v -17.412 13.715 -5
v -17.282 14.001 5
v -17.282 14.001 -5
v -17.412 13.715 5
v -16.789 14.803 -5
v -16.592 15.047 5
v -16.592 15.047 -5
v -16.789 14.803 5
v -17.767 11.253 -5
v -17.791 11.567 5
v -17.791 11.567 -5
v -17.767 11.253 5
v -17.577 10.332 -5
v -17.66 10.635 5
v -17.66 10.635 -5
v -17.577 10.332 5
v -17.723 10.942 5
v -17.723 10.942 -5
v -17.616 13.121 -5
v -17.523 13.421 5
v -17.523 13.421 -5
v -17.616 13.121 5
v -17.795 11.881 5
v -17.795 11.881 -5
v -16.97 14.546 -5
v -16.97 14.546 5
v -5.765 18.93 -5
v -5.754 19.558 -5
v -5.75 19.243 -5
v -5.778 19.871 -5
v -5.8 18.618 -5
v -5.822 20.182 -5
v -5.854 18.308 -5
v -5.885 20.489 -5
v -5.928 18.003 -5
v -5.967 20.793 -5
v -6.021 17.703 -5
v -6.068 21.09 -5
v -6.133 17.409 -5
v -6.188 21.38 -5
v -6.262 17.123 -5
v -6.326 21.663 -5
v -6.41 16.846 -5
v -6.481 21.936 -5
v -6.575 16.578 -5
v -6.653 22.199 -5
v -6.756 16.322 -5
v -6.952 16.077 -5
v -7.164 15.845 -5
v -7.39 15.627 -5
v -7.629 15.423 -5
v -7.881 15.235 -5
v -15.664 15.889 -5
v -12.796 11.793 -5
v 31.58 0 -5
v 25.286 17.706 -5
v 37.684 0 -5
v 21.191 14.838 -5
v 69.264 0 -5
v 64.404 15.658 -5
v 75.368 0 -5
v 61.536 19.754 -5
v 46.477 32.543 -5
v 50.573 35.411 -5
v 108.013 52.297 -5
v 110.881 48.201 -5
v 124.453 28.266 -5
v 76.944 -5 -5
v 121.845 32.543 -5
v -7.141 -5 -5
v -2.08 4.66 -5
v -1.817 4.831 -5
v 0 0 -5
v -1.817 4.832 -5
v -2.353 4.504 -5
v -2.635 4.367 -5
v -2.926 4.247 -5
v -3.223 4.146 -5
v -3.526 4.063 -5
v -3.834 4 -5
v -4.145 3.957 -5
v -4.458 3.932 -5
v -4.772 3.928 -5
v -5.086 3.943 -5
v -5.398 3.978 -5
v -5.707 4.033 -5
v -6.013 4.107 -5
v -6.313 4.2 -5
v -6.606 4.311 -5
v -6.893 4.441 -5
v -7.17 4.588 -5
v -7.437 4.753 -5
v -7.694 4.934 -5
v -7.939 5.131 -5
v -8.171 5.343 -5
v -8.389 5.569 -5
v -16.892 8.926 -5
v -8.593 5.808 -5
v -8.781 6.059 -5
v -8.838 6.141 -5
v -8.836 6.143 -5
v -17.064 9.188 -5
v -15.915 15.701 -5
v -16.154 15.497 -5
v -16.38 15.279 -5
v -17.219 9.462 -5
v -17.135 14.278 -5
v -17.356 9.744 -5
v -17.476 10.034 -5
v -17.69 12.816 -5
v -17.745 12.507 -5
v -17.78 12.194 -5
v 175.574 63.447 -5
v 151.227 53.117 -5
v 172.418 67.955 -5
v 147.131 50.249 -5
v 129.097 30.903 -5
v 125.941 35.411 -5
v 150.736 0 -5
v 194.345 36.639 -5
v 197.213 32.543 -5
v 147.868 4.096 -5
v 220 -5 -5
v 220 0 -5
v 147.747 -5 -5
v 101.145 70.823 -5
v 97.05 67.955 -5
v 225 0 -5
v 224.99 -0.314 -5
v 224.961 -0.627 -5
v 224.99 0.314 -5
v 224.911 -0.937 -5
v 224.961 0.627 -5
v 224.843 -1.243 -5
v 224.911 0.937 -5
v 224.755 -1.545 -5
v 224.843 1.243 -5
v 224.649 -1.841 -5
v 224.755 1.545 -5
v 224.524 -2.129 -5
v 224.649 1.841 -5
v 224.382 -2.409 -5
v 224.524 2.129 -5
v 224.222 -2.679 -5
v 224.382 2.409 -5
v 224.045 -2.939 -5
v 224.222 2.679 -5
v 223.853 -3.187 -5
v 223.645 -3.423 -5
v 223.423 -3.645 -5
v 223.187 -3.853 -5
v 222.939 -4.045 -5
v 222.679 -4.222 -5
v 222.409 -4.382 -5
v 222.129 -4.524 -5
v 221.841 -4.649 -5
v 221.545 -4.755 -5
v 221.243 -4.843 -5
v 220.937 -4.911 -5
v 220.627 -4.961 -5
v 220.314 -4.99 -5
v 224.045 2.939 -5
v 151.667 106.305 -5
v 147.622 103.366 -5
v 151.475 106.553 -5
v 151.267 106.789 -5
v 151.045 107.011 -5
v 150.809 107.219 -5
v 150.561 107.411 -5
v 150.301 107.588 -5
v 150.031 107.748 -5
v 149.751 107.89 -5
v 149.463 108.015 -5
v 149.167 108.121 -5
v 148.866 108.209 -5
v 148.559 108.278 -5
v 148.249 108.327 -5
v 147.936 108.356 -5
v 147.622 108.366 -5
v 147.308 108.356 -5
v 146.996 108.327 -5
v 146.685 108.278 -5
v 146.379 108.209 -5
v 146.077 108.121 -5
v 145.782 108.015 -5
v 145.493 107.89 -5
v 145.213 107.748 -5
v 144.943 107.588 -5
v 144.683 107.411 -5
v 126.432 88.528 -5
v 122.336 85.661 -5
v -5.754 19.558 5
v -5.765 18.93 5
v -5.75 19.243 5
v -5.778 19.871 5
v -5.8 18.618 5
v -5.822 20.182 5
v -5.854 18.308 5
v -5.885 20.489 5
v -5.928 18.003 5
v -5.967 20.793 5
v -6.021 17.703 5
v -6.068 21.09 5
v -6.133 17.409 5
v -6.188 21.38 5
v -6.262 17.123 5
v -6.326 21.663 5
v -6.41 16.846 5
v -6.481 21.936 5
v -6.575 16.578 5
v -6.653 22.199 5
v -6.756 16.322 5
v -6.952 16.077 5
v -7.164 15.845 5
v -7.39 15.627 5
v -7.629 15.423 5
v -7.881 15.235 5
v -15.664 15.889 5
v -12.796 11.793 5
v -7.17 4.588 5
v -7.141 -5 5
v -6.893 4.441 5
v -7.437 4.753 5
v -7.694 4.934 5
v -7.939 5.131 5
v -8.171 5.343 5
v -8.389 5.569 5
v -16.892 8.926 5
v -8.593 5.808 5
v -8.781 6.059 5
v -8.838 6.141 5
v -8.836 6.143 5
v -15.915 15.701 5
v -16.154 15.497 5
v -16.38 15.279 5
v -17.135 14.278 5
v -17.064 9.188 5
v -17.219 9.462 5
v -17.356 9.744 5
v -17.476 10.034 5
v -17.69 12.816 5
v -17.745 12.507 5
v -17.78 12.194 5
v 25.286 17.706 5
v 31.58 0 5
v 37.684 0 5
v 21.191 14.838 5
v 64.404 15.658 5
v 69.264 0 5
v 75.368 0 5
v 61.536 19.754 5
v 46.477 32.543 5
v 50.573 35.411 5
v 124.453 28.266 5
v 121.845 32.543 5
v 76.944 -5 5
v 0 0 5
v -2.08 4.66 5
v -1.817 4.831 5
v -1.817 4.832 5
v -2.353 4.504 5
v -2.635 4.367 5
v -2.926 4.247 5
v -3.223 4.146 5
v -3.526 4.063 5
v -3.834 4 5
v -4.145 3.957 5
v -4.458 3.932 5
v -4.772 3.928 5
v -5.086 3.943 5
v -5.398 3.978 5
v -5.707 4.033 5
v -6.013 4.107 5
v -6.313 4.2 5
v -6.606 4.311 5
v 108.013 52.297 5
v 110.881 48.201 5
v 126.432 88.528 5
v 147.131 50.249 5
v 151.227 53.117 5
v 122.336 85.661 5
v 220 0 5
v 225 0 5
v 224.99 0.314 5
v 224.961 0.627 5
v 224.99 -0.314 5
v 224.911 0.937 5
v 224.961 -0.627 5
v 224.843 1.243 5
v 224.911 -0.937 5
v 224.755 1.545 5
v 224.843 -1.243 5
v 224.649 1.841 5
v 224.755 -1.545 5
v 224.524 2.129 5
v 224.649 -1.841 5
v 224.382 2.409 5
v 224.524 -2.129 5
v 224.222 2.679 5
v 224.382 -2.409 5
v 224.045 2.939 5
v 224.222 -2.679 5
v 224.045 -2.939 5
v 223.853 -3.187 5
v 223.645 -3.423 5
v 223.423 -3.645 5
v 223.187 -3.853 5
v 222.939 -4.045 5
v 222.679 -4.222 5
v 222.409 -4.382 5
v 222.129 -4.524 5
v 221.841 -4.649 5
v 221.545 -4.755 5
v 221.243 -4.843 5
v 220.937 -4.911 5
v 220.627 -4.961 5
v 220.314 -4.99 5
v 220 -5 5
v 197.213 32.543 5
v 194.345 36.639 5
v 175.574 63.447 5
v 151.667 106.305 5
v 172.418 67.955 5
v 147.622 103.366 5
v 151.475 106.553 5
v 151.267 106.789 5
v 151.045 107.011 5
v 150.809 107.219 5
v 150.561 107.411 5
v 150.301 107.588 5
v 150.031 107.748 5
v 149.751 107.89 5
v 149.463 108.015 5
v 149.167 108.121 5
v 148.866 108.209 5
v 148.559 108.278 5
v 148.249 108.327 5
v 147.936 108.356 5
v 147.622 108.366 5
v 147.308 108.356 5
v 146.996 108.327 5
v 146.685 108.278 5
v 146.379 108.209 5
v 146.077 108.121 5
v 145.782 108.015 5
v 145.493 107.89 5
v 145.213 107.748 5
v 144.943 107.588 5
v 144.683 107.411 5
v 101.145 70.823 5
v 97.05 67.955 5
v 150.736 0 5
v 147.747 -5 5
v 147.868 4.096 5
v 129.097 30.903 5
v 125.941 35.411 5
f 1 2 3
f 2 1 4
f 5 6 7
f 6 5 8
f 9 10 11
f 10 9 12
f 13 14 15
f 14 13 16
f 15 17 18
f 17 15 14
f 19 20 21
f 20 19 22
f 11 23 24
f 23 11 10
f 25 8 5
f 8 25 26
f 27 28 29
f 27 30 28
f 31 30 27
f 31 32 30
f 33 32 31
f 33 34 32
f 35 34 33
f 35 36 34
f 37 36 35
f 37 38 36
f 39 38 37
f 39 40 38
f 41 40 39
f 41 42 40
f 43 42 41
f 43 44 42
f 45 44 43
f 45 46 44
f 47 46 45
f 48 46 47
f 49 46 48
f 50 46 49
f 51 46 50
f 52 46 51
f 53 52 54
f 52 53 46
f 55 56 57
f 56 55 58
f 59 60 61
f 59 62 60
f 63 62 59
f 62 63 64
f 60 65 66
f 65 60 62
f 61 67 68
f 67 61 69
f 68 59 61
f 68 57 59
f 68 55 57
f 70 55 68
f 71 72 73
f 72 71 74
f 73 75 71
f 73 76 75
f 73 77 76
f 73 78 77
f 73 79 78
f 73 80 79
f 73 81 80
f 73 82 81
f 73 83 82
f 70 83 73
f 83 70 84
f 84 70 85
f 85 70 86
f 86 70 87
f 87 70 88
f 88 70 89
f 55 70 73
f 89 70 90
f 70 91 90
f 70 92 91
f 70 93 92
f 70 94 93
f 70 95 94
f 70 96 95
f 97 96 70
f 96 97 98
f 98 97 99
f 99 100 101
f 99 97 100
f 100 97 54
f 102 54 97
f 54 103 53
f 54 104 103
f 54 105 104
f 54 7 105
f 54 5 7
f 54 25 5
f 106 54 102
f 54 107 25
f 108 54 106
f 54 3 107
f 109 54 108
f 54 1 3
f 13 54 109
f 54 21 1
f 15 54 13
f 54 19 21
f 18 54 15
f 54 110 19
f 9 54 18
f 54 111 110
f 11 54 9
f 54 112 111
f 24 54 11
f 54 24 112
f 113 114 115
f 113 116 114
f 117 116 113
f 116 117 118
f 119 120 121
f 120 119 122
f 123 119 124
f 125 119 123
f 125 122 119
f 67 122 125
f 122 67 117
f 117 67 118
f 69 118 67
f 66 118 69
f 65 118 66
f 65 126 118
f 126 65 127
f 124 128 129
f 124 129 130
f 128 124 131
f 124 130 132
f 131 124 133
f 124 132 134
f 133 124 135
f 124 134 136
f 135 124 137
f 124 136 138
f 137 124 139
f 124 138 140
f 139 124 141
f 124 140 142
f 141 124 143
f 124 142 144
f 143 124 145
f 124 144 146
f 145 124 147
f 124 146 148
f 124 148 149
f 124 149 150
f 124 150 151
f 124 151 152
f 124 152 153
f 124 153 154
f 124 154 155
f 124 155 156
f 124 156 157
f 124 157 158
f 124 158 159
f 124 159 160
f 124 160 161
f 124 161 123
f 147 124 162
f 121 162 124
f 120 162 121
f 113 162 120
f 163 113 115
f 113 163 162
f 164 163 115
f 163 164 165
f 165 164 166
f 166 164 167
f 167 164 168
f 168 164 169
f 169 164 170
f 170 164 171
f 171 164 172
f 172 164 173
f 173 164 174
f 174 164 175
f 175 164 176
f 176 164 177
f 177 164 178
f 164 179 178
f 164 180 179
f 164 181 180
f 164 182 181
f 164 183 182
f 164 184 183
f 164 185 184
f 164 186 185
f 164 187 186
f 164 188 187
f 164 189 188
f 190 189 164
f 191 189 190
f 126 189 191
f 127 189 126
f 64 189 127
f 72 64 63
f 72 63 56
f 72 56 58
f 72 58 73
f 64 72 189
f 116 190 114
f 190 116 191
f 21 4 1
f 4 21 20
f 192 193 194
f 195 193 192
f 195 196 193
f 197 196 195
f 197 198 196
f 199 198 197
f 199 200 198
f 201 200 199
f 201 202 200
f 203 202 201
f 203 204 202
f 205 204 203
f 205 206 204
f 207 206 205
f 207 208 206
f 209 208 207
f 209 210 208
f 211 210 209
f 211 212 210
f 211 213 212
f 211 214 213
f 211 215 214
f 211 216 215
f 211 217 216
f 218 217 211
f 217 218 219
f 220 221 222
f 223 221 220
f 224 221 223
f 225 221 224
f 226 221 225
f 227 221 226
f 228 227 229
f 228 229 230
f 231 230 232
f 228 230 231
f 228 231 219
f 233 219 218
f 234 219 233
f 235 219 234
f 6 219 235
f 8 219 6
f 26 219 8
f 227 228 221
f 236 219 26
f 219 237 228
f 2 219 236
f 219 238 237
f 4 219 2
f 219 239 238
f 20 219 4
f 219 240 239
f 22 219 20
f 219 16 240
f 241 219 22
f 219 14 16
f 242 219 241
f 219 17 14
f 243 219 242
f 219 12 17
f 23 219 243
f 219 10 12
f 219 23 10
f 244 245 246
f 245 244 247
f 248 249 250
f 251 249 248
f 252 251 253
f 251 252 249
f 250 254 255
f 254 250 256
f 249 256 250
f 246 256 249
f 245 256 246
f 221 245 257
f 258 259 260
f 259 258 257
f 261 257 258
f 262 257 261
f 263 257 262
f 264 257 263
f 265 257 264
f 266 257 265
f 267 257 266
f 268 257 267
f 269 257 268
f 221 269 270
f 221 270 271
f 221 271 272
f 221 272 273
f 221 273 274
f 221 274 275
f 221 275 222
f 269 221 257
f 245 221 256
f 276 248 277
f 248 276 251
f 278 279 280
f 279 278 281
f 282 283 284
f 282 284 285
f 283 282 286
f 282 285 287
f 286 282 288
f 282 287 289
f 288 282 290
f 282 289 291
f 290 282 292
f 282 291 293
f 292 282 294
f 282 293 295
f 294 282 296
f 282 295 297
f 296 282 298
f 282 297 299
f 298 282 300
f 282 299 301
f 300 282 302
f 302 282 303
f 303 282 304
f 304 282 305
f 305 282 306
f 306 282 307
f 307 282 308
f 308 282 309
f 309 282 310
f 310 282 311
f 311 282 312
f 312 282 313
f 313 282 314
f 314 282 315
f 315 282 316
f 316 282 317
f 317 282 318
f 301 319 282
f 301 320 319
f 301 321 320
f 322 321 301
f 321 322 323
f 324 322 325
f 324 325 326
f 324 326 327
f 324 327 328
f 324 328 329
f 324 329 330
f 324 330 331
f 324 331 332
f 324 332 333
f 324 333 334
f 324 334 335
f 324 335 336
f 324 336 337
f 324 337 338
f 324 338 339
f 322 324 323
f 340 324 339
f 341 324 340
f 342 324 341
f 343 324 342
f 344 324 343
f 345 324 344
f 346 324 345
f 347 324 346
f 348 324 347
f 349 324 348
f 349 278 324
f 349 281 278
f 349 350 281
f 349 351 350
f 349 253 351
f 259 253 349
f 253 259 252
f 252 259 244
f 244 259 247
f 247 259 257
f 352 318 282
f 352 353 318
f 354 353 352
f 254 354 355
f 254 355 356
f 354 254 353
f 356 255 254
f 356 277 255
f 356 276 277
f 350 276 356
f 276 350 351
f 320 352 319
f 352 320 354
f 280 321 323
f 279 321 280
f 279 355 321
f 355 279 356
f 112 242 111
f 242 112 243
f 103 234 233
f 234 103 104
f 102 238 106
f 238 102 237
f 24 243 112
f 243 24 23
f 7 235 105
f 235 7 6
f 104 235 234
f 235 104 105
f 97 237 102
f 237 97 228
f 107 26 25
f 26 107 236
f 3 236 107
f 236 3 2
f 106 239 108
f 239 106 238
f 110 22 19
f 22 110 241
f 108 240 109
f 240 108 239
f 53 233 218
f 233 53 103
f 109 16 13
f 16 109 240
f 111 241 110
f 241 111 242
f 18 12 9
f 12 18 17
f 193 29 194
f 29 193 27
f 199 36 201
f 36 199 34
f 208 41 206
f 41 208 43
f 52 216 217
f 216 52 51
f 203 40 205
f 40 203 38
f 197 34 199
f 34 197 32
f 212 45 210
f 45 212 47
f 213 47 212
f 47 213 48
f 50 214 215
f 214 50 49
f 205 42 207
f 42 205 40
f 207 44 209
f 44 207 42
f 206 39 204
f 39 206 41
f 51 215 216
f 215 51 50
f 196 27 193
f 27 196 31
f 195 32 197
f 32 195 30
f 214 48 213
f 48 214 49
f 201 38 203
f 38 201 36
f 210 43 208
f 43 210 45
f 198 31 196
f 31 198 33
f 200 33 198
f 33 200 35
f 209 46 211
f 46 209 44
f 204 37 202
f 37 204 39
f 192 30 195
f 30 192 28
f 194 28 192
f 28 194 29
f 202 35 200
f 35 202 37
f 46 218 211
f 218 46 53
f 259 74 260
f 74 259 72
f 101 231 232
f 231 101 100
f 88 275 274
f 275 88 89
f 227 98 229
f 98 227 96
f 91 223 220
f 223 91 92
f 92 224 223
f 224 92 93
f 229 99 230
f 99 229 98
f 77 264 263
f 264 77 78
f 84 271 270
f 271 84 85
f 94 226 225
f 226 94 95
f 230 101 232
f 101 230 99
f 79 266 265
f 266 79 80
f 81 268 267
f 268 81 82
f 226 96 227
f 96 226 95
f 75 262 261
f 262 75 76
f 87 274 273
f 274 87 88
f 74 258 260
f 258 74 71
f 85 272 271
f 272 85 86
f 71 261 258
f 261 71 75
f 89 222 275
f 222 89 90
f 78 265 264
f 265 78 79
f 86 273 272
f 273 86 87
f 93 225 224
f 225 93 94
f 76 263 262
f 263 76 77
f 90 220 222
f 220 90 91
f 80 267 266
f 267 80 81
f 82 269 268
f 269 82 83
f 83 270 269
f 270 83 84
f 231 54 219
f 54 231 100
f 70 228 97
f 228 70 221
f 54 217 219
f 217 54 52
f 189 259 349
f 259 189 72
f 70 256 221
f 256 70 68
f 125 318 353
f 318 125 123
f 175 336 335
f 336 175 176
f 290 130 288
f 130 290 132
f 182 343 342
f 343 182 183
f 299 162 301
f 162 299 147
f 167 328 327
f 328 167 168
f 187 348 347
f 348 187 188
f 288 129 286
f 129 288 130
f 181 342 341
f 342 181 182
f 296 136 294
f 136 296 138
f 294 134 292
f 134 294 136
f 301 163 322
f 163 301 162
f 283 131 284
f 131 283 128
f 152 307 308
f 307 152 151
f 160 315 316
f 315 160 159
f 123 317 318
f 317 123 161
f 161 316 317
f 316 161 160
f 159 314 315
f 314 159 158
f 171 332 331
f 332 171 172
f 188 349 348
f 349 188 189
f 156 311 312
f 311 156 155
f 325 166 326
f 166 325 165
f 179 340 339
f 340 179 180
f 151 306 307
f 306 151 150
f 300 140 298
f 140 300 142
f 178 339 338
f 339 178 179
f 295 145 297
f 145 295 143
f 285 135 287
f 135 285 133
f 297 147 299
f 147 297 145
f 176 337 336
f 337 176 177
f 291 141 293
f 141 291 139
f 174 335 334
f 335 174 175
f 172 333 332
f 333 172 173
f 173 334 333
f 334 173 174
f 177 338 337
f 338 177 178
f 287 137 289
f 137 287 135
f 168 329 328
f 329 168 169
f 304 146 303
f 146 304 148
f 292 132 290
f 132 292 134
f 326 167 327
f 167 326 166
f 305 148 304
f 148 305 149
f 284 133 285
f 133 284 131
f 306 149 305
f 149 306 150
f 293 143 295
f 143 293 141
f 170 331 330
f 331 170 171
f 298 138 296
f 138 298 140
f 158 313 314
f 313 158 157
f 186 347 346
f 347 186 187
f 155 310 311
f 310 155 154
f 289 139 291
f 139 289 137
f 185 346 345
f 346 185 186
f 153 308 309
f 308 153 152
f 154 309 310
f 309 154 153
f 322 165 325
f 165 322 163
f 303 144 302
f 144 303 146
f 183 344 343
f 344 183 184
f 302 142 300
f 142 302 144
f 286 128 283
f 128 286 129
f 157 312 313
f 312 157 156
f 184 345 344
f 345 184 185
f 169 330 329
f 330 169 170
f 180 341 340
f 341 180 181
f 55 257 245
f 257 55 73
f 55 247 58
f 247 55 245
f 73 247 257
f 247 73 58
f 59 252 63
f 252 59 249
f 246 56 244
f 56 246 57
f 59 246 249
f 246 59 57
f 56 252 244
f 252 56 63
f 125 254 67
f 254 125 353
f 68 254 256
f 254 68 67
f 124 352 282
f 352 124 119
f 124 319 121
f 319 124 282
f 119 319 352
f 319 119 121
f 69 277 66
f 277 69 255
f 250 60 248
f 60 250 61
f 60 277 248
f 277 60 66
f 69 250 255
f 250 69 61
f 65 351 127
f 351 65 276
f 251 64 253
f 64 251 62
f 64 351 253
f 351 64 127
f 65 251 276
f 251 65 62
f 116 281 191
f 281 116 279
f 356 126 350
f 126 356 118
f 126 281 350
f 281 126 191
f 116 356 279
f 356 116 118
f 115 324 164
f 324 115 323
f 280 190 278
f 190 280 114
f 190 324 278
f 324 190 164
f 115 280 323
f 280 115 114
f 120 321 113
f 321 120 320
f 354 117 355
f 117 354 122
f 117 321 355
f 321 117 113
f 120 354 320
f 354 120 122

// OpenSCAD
$fn=100;

*translate(-[ 18.45, 25.08, 70 ])import("GeomStandBig.stl");



//configure     default Vals MacBook Retina 15"
//roundings = 5;  //  5 
//Wall thickness (mm)
wallThick = 5;  // [2:8]

//Angle (Deg)
angleDeg = 35;  // [15:50]

//Deepnes of the base(mm)
baseDeep = 220; // 

//Width of the Stand(mm)
standWidth = 10;// [2:20]

//Spacing of the Hook(mm)
hookSpace = 12; // [5:20]

// Length of the Hook(mm). Zero = No Hook
hookLen = 6;   // [30]

/* [Hidden] */
fudge = 0.1;    //0.1

subDivs = 6;

surfaceLen = cos(angleDeg) * baseDeep;
topXCord = pow(surfaceLen,2)/baseDeep;
topYCord = sqrt((baseDeep-topXCord)*topXCord);


fieldWdth = (surfaceLen-(subDivs-1)*wallThick)/subDivs;
echo(surfaceLen,fieldWdth);
echo(norm([ 144.02, 100.45, 5.00 ]));

// triangle calculations
// tan alpha = GK/AK
// cos alpha = AK/HYP
// sin alpha = GK/HYP
// b²=c*q
// a²+b²=c²
dFieldWdth = fieldWdth*2+wallThick; //double field width (adjactence side)
GK = tan(angleDeg)*fieldWdth; //opposite width of triangle to remove

dGK = tan(angleDeg)* dFieldWdth; //opposite width of the large triangle
dAK = dFieldWdth;
dHYP = dGK / sin(angleDeg); //hypotenuse width of large triangle

HYP1 = sqrt(pow(fieldWdth,2)+pow(GK,2)); //The hypotenuse of the triangle to remove
HYP2 = wallThick / cos(angleDeg);  //the hypotenuse of the small wall base, width to next triangle
GK2 = sqrt(pow(HYP2,2)-pow(wallThick,2)); //opposite width of the small tri at the base f the wall
GK3 = sin(angleDeg)*wallThick; //opposite width of small tri at the rightmost triangle
AK3 = cos(angleDeg)*wallThick;

GK4 = wallThick-AK3+fudge; //very small Tri at opener
HYP4 = GK4/sin(angleDeg);
AK4 = cos(angleDeg) * HYP4;

AK5 = GK4;
HYP5 = AK5/cos(angleDeg);

Hg = sin(angleDeg)*dFieldWdth;
q = Hg+wallThick/tan(angleDeg);
echo(GK3);
    

//base geometry
//big one
difference(){
union(){
    hull(){
        cylinder(h=standWidth,r=wallThick, center=true);
        translate ([baseDeep,0,0]) 
            cylinder(h=standWidth,r=wallThick, center=true);
        translate ([topXCord,topYCord,0]) 
            cylinder(h=standWidth,r=wallThick, center=true);
    }

    //get translation for the hook in X dir
    AK=wallThick/tan(angleDeg);

    translate([-AK,-wallThick,-standWidth/2])
        rotate([0,0,angleDeg])       
            hook();
    translate([-AK,-wallThick,-standWidth/2]) 
        cube([AK,wallThick,standWidth]);
}


// now the recesses 
//polys
    //#1
    rotate([0,0,angleDeg]) linear_extrude(height=standWidth+fudge,center=true) polygon([[0,0],[fieldWdth,0],[fieldWdth,-GK]]);
    //#2 (tri+quad)
    translate ([HYP1+HYP2,0,0]) 
        rotate([0,0,angleDeg]) 
        linear_extrude(height=standWidth+fudge,center=true) 
            polygon([[0,0],[0,GK+GK2],[fieldWdth,GK+GK2],[fieldWdth,0],[fieldWdth,-GK]]);
    //#3 (double, opens at bottom)
    //#translate ([(HYP1+HYP2)*2+GK3,-AK3,0]) 
    translate ([(HYP1+HYP2)*2+GK3-AK4,-wallThick-fudge,0]) 
        rotate([0,0,angleDeg]) 
        linear_extrude(height=standWidth+fudge,center=true) 
            polygon([[0,0],[dFieldWdth+AK4,0],[dFieldWdth+AK4,-dGK-HYP5]]);

    //#4 (double)
    translate ([(HYP1+HYP2)*4,0,0]) rotate([0,0,angleDeg]) 
        linear_extrude(height=standWidth+fudge,center=true) 
            polygon([[0,0],[dFieldWdth,0],[dFieldWdth,-dGK]]);
            
//now the rectangles
    recDepth2=2*(GK+GK2);
    //#1
    translate([(HYP1+HYP2)*2,0,-(standWidth+fudge)/2])
        rotate([0,0,angleDeg]) cube([dFieldWdth,(recDepth2-wallThick)/2,standWidth+fudge]);
    //#2
    translate([(HYP1+HYP2)*2,0,-(standWidth+fudge)/2])
        rotate([0,0,angleDeg]) 
            translate([0,(recDepth2-wallThick)/2+wallThick,0])cube([dFieldWdth,(recDepth2-wallThick)/2,standWidth+fudge]);
    //#3
    translate([(HYP1+HYP2)*4,0,-(standWidth+fudge)/2])rotate([0,0,angleDeg]) 
        translate([0,dGK+GK2,0])cube([fieldWdth,recDepth2,standWidth+fudge]);
        
 
    //#4
    translate([(HYP1+HYP2)*5,0,-(standWidth+fudge)/2])rotate([0,0,angleDeg]) 
        translate([0,dGK+GK2+GK+GK2,0])cube([fieldWdth,recDepth2,standWidth+fudge,]);
        
    //#5
    translate([(HYP1+HYP2)*4-GK3,AK3,-(standWidth+fudge)/2]) rotate([0,0,angleDeg]) 
        translate([0,0,0])cube([fieldWdth*2+wallThick,2*GK-GK2,standWidth+fudge,]);
   
    
}
// the small one
*color("red")
    translate([0,0,20])
    difference(){
        union(){
            hull(){
                cylinder(h=standWidth,r=wallThick, center=true);
                translate ([2*HYP1+HYP2,0,0]) 
                    cylinder(h=standWidth,r=wallThick, center=true);
                rotate([0,0,angleDeg])
                translate ([surfaceLen*(2/subDivs)-wallThick/2,0,0]) 
                    cylinder(h=standWidth,r=wallThick, center=true);
            }

            //get translation for the hook in X dir
            AK=wallThick/tan(angleDeg);

            translate([-AK,-wallThick,-standWidth/2])
                rotate([0,0,angleDeg])       
                    hook();
            translate([-AK,-wallThick,-standWidth/2]) 
                cube([AK,wallThick,standWidth]);
        }
        //#1
        rotate([0,0,angleDeg]) linear_extrude(height=standWidth+fudge,center=true) polygon([[0,0],[fieldWdth,0],[fieldWdth,-GK]]);
        
        //#2 (tri+quad)
        translate ([HYP1+HYP2,0,0]) 
            rotate([0,0,angleDeg]) 
            linear_extrude(height=standWidth+fudge,center=true) 
                polygon([[0,0],[0,GK+GK2],[fieldWdth,GK+GK2],[fieldWdth,0],[fieldWdth,-GK]]);
    }


module hook(){

    union(){
        cube([wallThick,hookSpace+wallThick,standWidth]);
        translate([wallThick,hookSpace+wallThick,0])
            intersection(){
                cylinder(h=standWidth,r=wallThick, center=false);
                translate([-wallThick-fudge,0,-fudge/2]) cube([wallThick+fudge,wallThick+fudge,standWidth+fudge]);
            }
        if (hookLen) translate([wallThick,hookSpace+wallThick,0]) cube([hookLen,wallThick,standWidth]);
        if (hookLen) translate([wallThick+hookLen,hookSpace+wallThick*2,0]) 
            intersection(){
            cylinder(h=standWidth,r=wallThick, center=false);
                translate([0,-wallThick-fudge,-fudge/2]) cube([wallThick+fudge,wallThick+fudge,standWidth+fudge]);
            }
        translate([wallThick*2,2*wallThick,0]) 
            difference(){
                translate([-wallThick-fudge,-2*wallThick,0]) cube([wallThick+fudge,2*wallThick+fudge,standWidth]);
                translate([0,0,-fudge/2]) cylinder(h=standWidth+fudge,r=wallThick, center=false);
            }
    }
}
